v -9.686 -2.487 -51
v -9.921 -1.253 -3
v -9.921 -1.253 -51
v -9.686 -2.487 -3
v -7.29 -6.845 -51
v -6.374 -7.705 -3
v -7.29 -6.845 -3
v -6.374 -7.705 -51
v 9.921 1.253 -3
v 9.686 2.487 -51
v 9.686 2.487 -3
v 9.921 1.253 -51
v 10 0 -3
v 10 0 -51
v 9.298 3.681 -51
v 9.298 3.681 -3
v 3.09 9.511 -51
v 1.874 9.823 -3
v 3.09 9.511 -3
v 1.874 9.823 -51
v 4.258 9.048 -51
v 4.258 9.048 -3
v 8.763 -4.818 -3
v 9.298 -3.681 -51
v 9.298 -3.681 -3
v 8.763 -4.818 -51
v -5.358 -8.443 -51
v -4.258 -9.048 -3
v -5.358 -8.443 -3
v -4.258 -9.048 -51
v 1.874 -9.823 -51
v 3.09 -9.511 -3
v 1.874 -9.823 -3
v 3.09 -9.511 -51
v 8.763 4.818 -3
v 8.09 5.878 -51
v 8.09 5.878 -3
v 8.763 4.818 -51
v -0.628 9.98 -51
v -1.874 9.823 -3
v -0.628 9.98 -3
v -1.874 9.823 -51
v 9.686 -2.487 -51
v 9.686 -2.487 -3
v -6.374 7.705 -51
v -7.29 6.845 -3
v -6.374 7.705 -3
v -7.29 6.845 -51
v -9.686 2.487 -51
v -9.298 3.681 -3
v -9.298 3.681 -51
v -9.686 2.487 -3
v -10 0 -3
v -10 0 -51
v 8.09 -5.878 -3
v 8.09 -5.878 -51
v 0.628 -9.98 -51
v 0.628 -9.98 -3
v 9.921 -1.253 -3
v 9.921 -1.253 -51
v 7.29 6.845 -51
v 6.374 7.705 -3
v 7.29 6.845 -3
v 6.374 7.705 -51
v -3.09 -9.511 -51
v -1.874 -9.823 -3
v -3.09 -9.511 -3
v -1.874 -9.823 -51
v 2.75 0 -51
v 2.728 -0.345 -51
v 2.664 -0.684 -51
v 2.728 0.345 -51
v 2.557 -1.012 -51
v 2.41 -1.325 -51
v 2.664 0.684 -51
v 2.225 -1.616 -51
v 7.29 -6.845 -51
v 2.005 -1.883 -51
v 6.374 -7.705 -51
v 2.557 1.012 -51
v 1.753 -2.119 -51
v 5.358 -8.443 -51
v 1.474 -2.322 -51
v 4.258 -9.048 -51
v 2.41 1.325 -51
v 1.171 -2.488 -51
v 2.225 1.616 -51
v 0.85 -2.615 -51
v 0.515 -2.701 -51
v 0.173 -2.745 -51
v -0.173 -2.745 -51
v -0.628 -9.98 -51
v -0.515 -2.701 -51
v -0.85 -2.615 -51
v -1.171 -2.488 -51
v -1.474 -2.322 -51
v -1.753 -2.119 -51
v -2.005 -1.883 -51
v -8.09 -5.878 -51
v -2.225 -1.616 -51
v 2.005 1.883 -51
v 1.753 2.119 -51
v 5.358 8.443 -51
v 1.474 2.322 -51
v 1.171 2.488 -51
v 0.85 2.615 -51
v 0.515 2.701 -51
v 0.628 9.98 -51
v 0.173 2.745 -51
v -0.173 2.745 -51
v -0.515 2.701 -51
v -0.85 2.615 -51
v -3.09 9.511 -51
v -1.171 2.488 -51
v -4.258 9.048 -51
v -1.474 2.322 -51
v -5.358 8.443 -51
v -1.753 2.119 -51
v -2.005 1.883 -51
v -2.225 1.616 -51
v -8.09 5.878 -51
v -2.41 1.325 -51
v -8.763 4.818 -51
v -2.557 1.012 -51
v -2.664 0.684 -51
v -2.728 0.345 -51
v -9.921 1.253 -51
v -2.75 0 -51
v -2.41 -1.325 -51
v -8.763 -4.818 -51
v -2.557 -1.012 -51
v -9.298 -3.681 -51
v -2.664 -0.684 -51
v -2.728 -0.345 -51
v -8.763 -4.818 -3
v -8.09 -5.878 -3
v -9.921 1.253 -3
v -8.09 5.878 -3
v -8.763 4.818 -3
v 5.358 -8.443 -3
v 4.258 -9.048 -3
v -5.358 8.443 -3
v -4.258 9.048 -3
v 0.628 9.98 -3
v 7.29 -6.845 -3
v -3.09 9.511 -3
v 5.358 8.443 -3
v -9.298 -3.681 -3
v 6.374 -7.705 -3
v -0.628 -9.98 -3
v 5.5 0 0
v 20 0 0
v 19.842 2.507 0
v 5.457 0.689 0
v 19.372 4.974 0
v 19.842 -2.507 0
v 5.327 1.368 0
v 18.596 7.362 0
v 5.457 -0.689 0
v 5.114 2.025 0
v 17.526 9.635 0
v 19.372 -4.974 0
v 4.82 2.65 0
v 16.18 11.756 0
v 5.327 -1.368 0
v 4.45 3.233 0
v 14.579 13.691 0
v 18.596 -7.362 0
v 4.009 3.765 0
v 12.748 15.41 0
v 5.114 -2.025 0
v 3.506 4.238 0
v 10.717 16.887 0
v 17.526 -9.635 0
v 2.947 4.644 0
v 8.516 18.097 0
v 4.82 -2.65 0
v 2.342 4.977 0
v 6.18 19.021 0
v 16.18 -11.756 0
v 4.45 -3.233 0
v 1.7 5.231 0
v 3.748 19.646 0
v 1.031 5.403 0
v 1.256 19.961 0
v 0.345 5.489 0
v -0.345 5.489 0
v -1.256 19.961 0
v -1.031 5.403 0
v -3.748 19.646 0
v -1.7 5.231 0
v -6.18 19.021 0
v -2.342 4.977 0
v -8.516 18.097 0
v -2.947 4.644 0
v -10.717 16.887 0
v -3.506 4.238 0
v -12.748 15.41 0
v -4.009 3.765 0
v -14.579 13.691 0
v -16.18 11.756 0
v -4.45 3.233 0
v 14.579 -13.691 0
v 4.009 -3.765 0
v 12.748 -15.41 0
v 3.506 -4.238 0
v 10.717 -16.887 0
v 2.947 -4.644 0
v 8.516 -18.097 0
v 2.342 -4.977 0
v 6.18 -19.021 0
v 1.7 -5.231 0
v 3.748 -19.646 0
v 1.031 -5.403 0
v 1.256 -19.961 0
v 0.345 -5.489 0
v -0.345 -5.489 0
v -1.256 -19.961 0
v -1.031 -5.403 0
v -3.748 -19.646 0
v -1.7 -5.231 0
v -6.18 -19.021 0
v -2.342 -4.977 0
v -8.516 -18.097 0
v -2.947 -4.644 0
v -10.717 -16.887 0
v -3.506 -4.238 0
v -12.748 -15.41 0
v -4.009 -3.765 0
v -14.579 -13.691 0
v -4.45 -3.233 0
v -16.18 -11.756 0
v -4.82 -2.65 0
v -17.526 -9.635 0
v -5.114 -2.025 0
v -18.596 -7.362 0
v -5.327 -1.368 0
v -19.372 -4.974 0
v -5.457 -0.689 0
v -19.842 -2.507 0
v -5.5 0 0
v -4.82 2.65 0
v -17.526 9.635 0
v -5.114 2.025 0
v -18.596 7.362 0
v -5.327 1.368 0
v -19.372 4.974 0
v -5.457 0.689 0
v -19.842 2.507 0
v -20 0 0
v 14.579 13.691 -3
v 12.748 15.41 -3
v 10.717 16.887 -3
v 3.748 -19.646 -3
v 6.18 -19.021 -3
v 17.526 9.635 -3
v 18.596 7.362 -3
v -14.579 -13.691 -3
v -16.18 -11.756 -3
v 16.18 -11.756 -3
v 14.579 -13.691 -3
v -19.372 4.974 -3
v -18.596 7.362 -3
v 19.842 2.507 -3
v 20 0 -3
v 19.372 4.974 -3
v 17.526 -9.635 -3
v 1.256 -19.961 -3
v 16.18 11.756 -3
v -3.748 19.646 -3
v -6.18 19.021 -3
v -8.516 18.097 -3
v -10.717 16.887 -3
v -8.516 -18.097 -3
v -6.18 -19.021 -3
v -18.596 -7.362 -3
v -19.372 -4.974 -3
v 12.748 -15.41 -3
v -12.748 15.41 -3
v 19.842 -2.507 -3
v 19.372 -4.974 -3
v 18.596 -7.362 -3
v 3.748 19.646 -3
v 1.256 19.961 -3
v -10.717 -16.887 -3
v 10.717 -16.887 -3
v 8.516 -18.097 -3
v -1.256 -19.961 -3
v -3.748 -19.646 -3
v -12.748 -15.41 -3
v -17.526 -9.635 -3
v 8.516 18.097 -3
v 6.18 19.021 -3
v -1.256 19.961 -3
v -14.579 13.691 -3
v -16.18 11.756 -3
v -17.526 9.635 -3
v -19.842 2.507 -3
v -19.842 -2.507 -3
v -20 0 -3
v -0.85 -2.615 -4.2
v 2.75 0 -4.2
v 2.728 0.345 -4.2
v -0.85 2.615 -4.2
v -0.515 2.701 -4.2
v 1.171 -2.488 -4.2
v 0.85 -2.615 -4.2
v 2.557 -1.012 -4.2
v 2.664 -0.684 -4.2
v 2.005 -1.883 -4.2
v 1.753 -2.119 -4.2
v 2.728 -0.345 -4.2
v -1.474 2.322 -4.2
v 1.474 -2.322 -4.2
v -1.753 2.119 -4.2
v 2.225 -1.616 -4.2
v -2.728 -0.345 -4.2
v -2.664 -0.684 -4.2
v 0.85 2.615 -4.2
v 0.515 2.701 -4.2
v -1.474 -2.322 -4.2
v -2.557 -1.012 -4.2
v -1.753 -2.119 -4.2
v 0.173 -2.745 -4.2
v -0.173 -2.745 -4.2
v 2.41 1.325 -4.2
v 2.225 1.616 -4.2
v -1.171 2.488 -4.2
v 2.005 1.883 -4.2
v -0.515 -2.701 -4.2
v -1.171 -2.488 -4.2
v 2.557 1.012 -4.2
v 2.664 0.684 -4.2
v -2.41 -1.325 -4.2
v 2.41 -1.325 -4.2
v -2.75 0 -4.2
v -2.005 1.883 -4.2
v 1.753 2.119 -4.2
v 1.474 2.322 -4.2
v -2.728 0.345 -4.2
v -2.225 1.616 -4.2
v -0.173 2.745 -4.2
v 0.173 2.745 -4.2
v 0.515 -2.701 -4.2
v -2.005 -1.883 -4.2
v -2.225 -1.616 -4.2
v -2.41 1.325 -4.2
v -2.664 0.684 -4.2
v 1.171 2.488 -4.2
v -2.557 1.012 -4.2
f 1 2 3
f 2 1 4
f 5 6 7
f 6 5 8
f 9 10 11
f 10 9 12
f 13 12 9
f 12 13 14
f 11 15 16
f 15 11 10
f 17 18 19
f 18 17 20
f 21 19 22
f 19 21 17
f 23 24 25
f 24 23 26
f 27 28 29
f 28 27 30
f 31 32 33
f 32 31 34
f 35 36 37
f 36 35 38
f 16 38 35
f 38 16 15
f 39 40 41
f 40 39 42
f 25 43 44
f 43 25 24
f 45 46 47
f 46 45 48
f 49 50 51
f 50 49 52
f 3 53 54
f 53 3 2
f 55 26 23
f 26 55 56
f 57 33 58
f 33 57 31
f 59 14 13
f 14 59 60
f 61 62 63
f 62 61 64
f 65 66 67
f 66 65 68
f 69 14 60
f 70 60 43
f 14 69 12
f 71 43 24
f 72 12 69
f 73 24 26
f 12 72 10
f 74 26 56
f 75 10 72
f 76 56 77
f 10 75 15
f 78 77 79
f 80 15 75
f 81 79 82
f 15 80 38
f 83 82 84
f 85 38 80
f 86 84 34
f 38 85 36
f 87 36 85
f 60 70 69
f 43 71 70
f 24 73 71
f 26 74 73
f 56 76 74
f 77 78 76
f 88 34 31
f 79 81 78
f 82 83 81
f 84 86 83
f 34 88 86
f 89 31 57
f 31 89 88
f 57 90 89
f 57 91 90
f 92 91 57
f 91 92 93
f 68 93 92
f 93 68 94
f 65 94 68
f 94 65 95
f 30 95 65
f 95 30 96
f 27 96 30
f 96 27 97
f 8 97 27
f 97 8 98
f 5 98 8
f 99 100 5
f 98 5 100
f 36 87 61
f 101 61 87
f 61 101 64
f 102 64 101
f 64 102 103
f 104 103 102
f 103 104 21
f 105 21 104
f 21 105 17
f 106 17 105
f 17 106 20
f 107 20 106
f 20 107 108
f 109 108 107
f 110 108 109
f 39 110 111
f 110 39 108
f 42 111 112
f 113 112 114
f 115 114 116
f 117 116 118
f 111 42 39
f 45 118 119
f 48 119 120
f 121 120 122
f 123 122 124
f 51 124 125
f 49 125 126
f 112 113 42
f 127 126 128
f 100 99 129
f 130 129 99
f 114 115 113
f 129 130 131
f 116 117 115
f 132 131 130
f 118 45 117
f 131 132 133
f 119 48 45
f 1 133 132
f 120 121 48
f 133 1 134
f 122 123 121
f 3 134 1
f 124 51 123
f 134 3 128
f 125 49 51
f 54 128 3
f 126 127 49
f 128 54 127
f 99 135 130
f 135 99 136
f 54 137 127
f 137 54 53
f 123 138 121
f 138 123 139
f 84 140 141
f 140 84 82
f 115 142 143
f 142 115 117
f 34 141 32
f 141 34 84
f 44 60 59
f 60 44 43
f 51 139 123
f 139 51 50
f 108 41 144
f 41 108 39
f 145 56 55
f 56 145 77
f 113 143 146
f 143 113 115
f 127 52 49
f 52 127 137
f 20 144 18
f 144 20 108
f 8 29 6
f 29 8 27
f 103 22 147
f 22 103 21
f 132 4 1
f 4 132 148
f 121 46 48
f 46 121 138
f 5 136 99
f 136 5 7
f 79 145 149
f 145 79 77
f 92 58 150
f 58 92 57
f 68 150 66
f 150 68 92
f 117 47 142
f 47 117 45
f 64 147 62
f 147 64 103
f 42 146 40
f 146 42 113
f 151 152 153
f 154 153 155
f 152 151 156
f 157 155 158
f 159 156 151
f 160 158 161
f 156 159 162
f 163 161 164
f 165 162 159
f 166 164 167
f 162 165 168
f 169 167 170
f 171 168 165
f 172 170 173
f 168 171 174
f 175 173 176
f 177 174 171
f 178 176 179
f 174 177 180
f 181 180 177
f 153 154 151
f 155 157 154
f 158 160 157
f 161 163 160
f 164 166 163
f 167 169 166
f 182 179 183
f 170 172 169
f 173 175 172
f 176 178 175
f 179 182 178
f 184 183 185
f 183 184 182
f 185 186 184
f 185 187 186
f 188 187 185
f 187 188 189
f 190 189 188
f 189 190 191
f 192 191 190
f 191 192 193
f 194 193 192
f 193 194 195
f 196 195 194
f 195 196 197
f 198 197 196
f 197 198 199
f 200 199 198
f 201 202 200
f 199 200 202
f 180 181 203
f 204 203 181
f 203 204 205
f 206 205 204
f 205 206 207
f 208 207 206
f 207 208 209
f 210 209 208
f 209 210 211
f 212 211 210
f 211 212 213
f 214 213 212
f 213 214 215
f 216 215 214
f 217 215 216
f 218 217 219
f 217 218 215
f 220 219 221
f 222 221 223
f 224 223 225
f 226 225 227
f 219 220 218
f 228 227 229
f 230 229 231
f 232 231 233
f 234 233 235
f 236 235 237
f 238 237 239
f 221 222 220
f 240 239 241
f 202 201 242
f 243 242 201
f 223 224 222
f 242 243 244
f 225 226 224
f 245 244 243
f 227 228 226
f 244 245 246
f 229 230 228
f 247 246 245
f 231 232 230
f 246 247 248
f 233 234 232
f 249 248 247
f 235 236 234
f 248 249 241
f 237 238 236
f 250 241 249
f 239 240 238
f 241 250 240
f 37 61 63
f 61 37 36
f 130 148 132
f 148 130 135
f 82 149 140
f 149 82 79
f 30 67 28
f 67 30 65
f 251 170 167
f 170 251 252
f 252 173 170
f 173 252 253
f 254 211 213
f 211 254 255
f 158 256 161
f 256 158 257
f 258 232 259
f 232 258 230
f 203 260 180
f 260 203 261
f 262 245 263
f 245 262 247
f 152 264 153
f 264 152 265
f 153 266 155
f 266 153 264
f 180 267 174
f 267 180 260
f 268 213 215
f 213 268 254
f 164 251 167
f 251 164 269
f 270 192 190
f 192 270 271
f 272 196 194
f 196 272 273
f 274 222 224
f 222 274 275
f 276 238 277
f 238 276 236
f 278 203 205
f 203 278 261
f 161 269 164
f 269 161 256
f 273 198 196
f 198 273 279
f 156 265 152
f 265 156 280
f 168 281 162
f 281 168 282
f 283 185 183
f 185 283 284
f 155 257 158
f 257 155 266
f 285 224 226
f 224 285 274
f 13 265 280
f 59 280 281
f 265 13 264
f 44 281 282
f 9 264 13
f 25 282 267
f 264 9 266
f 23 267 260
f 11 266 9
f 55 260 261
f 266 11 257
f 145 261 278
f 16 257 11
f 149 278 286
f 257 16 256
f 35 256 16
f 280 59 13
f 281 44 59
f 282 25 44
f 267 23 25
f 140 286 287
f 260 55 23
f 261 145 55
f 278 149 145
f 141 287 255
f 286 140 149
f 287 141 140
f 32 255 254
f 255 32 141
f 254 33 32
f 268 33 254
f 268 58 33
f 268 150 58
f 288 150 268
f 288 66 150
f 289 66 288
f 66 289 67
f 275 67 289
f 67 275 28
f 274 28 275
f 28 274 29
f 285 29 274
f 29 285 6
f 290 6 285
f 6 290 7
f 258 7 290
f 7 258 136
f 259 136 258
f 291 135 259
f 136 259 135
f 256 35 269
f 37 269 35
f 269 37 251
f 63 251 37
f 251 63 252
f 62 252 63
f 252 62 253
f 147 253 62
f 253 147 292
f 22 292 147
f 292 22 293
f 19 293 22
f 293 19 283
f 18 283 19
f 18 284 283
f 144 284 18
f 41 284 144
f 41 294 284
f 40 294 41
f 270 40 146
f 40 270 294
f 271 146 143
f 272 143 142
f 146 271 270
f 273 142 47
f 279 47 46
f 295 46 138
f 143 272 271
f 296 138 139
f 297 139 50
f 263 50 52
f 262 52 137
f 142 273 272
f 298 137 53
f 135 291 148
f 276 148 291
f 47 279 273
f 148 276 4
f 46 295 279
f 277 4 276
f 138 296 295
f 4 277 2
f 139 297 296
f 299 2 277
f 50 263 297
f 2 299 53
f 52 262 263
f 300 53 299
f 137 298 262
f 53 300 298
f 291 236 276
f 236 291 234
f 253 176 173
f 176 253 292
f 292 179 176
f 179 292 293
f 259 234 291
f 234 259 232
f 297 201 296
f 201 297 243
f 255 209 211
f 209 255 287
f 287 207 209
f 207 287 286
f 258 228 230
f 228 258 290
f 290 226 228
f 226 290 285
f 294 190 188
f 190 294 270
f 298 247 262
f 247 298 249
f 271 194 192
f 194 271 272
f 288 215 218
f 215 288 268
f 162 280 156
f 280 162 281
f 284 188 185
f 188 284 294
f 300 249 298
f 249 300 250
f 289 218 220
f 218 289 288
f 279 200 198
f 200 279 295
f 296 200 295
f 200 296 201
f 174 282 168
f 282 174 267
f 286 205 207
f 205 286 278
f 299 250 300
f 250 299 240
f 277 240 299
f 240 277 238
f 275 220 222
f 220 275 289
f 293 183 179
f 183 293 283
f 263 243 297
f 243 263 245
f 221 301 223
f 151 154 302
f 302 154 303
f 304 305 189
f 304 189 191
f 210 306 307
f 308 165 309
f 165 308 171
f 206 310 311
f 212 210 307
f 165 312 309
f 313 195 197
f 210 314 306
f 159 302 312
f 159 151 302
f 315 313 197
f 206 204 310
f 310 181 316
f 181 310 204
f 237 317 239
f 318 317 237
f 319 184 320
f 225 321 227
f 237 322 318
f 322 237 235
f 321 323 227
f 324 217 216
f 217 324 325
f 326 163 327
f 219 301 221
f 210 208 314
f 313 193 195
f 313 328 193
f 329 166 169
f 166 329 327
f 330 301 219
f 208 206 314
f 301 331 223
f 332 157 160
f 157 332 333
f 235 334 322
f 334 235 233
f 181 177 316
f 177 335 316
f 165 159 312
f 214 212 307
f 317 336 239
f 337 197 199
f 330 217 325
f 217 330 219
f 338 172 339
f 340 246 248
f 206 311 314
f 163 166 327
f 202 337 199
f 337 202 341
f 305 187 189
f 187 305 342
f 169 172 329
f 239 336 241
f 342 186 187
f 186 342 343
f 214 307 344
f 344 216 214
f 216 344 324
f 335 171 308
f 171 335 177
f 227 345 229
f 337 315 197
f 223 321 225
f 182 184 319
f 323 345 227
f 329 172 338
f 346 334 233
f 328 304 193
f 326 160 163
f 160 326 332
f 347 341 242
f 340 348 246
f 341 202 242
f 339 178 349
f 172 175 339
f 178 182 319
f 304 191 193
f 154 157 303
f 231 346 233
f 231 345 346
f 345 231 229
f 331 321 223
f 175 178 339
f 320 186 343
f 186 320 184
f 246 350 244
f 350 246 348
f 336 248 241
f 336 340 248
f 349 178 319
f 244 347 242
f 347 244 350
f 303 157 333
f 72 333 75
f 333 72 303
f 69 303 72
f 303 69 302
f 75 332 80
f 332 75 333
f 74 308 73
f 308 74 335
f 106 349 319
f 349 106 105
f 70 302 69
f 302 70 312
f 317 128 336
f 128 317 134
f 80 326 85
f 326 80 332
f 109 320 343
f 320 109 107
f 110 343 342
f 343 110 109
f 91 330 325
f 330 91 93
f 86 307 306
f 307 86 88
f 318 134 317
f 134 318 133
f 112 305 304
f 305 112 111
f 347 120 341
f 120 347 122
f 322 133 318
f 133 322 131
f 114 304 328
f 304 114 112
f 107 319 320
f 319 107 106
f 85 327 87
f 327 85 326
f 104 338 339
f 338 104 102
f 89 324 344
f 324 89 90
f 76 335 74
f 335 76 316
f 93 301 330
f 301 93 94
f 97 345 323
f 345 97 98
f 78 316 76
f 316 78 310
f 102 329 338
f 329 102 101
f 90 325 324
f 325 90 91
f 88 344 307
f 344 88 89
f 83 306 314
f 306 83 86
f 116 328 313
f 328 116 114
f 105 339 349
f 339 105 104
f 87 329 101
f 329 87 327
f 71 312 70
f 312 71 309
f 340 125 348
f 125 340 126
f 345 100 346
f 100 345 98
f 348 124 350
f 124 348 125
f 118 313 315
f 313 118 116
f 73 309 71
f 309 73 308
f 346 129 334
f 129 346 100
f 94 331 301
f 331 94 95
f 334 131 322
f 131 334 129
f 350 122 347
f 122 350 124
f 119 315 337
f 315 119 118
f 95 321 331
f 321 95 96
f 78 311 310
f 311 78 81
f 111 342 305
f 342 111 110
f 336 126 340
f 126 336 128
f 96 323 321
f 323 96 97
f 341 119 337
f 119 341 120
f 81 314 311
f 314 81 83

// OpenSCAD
$fn = 50;


difference() {
	union() {
		translate(v = [0, 0, -51.0000000000]) {
			cylinder(h = 51, r = 10.0000000000);
		}
		translate(v = [0, 0, -3.0000000000]) {
			cylinder(h = 3, r = 20.0000000000);
		}
	}
	union() {
		translate(v = [0, 0, 0]) {
			rotate(a = [0, 0, 0]) {
				difference() {
					union() {
						#translate(v = [0, 0, -51.0000000000]) {
							cylinder(h = 51, r = 2.2500000000);
						}
						#translate(v = [0, 0, -4.2000000000]) {
							cylinder(h = 4.2000000000, r = 10.0000000000, r1 = 2.7500000000, r2 = 5.5000000000);
						}
						#translate(v = [0, 0, -51.0000000000]) {
							cylinder(h = 51, r = 2.7500000000);
						}
						#translate(v = [0, 0, -51.0000000000]) {
							cylinder(h = 51, r = 2.2500000000);
						}
					}
					union();
				}
			}
		}
	}
}
